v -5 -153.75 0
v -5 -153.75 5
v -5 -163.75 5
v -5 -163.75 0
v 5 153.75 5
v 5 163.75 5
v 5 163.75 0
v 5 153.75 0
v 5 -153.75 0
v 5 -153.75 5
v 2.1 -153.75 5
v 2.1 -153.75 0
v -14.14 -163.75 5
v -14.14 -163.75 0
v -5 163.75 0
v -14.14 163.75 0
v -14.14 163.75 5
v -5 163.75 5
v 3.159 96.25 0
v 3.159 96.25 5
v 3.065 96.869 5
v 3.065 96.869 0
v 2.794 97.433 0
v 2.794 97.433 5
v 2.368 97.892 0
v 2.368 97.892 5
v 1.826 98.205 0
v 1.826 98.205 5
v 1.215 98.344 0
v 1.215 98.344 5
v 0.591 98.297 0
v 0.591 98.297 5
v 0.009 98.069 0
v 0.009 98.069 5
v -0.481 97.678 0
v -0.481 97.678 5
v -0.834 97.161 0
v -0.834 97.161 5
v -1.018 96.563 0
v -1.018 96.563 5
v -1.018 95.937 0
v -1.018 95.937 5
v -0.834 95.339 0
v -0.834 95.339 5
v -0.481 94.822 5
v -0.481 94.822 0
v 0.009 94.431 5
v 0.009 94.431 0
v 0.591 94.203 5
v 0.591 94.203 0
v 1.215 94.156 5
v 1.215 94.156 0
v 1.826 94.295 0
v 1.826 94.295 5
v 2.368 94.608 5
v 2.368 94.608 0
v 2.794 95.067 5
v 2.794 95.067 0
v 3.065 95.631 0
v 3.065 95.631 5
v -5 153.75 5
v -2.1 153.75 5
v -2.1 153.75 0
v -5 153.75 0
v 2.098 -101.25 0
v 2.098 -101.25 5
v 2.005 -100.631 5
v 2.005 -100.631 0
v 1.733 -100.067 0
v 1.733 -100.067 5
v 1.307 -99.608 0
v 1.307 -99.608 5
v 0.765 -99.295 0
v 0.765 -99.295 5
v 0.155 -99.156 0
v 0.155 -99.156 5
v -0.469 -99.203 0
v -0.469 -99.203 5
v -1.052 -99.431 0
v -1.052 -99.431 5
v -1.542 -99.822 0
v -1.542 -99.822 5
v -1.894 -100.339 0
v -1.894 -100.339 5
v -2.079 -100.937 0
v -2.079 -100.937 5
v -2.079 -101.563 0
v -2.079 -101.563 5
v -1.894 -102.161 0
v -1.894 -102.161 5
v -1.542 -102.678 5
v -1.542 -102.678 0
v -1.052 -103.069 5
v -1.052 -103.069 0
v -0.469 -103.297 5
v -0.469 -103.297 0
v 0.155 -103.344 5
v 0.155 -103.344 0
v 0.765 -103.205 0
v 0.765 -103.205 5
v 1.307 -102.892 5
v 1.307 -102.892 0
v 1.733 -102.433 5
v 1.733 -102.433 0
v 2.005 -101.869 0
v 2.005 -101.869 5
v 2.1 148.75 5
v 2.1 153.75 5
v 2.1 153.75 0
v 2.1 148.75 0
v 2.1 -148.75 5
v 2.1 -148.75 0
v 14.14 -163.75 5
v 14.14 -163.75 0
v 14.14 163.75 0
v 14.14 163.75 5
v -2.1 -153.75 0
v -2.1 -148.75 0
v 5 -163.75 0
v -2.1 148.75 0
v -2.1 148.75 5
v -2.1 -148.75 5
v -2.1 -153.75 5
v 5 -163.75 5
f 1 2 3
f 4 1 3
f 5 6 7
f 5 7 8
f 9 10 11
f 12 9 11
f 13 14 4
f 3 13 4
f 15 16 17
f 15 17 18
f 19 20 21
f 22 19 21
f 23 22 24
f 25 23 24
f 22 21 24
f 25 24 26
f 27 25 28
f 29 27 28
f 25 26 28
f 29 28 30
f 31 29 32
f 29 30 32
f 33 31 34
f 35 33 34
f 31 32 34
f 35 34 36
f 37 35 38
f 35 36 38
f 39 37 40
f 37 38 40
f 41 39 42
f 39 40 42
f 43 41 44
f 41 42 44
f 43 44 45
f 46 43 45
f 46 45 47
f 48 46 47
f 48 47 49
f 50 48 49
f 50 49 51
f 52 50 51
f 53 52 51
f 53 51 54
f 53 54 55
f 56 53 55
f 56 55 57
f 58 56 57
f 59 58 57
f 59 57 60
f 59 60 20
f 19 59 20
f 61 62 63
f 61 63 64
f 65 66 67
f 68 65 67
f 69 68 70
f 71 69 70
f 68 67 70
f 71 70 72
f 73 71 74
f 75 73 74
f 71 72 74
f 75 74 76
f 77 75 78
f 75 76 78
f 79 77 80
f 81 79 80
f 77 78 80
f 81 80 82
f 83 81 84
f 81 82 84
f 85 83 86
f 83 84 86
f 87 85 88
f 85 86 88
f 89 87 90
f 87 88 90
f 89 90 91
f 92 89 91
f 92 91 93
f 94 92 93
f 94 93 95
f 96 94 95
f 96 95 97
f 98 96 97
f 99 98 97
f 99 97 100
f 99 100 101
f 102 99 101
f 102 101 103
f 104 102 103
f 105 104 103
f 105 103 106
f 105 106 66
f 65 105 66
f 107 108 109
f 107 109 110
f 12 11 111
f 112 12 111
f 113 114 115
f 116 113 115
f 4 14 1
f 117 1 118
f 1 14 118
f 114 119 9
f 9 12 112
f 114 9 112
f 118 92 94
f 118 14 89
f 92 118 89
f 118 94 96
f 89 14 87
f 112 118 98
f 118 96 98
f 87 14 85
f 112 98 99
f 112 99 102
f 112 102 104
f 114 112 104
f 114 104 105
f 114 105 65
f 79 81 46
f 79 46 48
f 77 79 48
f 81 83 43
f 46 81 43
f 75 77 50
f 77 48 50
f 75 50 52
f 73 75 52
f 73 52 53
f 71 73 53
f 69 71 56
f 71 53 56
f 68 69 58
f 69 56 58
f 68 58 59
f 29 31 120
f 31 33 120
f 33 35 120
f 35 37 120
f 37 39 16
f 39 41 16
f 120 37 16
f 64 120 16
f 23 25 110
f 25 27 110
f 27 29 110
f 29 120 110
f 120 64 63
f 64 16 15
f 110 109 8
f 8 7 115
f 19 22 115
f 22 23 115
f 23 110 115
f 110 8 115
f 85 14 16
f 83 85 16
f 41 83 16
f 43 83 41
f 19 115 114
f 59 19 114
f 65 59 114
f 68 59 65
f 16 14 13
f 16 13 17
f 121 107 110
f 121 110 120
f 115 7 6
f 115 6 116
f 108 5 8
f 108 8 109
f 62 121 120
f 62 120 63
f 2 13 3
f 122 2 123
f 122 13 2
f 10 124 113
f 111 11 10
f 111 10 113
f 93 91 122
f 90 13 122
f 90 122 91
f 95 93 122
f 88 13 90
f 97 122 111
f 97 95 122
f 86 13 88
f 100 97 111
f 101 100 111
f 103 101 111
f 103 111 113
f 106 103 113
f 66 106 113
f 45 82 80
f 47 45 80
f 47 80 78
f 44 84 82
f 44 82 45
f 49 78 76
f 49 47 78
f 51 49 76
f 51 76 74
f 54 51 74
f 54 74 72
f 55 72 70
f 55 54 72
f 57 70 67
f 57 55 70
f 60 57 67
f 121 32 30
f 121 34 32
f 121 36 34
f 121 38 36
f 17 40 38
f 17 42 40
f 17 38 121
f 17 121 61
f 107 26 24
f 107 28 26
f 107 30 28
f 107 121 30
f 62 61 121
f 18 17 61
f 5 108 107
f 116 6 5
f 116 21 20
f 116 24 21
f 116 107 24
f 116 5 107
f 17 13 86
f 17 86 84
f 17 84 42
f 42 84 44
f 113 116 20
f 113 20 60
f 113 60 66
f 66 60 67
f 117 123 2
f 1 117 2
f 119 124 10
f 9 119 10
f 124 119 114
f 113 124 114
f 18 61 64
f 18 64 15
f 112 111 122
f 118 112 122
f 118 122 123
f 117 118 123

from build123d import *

# Parameters (mm, degrees)
SKETCH1_W           = 28.28
SKETCH1_H           = 327.5
BOSS_EXTRUDE1_DEPTH = 5
SKETCH2_R           = 2.1
CUT_EXTRUDE1_DEPTH  = 10
SKETCH3_R           = 2.1
CUT_EXTRUDE2_DEPTH  = 10


with BuildPart() as part:
    # Sketch1 → Boss-Extrude1 (new body)
    with BuildSketch(Plane.XY):
        Rectangle(SKETCH1_W, SKETCH1_H)
    extrude(amount=BOSS_EXTRUDE1_DEPTH)

    # Sketch2 → Cut-Extrude1 (cut)
    with BuildSketch(Plane.XY.offset(5)):
        with Locations((1.058524548, 96.25)):
            Circle(SKETCH2_R)
        Polygon((5, 163.75), (5, 153.75), (2.1, 153.75), (2.1, 148.75), (-2.1, 148.75), (-2.1, 153.75), (-5, 153.75), (-5, 163.75), align=None)
        Polygon((2.1, -148.75), (-2.1, -148.75), (-2.1, -153.75), (-5, -153.75), (-5, -163.75), (5, -163.75), (5, -153.75), (2.1, -153.75), align=None)
    extrude(amount=-CUT_EXTRUDE1_DEPTH, mode=Mode.SUBTRACT)

    # Sketch3 → Cut-Extrude2 (cut)
    with BuildSketch(Plane.XY.offset(5)):
        with Locations((-0.002135624, -101.25)):
            Circle(SKETCH3_R)
    extrude(amount=-CUT_EXTRUDE2_DEPTH, mode=Mode.SUBTRACT)


solid = part.part
